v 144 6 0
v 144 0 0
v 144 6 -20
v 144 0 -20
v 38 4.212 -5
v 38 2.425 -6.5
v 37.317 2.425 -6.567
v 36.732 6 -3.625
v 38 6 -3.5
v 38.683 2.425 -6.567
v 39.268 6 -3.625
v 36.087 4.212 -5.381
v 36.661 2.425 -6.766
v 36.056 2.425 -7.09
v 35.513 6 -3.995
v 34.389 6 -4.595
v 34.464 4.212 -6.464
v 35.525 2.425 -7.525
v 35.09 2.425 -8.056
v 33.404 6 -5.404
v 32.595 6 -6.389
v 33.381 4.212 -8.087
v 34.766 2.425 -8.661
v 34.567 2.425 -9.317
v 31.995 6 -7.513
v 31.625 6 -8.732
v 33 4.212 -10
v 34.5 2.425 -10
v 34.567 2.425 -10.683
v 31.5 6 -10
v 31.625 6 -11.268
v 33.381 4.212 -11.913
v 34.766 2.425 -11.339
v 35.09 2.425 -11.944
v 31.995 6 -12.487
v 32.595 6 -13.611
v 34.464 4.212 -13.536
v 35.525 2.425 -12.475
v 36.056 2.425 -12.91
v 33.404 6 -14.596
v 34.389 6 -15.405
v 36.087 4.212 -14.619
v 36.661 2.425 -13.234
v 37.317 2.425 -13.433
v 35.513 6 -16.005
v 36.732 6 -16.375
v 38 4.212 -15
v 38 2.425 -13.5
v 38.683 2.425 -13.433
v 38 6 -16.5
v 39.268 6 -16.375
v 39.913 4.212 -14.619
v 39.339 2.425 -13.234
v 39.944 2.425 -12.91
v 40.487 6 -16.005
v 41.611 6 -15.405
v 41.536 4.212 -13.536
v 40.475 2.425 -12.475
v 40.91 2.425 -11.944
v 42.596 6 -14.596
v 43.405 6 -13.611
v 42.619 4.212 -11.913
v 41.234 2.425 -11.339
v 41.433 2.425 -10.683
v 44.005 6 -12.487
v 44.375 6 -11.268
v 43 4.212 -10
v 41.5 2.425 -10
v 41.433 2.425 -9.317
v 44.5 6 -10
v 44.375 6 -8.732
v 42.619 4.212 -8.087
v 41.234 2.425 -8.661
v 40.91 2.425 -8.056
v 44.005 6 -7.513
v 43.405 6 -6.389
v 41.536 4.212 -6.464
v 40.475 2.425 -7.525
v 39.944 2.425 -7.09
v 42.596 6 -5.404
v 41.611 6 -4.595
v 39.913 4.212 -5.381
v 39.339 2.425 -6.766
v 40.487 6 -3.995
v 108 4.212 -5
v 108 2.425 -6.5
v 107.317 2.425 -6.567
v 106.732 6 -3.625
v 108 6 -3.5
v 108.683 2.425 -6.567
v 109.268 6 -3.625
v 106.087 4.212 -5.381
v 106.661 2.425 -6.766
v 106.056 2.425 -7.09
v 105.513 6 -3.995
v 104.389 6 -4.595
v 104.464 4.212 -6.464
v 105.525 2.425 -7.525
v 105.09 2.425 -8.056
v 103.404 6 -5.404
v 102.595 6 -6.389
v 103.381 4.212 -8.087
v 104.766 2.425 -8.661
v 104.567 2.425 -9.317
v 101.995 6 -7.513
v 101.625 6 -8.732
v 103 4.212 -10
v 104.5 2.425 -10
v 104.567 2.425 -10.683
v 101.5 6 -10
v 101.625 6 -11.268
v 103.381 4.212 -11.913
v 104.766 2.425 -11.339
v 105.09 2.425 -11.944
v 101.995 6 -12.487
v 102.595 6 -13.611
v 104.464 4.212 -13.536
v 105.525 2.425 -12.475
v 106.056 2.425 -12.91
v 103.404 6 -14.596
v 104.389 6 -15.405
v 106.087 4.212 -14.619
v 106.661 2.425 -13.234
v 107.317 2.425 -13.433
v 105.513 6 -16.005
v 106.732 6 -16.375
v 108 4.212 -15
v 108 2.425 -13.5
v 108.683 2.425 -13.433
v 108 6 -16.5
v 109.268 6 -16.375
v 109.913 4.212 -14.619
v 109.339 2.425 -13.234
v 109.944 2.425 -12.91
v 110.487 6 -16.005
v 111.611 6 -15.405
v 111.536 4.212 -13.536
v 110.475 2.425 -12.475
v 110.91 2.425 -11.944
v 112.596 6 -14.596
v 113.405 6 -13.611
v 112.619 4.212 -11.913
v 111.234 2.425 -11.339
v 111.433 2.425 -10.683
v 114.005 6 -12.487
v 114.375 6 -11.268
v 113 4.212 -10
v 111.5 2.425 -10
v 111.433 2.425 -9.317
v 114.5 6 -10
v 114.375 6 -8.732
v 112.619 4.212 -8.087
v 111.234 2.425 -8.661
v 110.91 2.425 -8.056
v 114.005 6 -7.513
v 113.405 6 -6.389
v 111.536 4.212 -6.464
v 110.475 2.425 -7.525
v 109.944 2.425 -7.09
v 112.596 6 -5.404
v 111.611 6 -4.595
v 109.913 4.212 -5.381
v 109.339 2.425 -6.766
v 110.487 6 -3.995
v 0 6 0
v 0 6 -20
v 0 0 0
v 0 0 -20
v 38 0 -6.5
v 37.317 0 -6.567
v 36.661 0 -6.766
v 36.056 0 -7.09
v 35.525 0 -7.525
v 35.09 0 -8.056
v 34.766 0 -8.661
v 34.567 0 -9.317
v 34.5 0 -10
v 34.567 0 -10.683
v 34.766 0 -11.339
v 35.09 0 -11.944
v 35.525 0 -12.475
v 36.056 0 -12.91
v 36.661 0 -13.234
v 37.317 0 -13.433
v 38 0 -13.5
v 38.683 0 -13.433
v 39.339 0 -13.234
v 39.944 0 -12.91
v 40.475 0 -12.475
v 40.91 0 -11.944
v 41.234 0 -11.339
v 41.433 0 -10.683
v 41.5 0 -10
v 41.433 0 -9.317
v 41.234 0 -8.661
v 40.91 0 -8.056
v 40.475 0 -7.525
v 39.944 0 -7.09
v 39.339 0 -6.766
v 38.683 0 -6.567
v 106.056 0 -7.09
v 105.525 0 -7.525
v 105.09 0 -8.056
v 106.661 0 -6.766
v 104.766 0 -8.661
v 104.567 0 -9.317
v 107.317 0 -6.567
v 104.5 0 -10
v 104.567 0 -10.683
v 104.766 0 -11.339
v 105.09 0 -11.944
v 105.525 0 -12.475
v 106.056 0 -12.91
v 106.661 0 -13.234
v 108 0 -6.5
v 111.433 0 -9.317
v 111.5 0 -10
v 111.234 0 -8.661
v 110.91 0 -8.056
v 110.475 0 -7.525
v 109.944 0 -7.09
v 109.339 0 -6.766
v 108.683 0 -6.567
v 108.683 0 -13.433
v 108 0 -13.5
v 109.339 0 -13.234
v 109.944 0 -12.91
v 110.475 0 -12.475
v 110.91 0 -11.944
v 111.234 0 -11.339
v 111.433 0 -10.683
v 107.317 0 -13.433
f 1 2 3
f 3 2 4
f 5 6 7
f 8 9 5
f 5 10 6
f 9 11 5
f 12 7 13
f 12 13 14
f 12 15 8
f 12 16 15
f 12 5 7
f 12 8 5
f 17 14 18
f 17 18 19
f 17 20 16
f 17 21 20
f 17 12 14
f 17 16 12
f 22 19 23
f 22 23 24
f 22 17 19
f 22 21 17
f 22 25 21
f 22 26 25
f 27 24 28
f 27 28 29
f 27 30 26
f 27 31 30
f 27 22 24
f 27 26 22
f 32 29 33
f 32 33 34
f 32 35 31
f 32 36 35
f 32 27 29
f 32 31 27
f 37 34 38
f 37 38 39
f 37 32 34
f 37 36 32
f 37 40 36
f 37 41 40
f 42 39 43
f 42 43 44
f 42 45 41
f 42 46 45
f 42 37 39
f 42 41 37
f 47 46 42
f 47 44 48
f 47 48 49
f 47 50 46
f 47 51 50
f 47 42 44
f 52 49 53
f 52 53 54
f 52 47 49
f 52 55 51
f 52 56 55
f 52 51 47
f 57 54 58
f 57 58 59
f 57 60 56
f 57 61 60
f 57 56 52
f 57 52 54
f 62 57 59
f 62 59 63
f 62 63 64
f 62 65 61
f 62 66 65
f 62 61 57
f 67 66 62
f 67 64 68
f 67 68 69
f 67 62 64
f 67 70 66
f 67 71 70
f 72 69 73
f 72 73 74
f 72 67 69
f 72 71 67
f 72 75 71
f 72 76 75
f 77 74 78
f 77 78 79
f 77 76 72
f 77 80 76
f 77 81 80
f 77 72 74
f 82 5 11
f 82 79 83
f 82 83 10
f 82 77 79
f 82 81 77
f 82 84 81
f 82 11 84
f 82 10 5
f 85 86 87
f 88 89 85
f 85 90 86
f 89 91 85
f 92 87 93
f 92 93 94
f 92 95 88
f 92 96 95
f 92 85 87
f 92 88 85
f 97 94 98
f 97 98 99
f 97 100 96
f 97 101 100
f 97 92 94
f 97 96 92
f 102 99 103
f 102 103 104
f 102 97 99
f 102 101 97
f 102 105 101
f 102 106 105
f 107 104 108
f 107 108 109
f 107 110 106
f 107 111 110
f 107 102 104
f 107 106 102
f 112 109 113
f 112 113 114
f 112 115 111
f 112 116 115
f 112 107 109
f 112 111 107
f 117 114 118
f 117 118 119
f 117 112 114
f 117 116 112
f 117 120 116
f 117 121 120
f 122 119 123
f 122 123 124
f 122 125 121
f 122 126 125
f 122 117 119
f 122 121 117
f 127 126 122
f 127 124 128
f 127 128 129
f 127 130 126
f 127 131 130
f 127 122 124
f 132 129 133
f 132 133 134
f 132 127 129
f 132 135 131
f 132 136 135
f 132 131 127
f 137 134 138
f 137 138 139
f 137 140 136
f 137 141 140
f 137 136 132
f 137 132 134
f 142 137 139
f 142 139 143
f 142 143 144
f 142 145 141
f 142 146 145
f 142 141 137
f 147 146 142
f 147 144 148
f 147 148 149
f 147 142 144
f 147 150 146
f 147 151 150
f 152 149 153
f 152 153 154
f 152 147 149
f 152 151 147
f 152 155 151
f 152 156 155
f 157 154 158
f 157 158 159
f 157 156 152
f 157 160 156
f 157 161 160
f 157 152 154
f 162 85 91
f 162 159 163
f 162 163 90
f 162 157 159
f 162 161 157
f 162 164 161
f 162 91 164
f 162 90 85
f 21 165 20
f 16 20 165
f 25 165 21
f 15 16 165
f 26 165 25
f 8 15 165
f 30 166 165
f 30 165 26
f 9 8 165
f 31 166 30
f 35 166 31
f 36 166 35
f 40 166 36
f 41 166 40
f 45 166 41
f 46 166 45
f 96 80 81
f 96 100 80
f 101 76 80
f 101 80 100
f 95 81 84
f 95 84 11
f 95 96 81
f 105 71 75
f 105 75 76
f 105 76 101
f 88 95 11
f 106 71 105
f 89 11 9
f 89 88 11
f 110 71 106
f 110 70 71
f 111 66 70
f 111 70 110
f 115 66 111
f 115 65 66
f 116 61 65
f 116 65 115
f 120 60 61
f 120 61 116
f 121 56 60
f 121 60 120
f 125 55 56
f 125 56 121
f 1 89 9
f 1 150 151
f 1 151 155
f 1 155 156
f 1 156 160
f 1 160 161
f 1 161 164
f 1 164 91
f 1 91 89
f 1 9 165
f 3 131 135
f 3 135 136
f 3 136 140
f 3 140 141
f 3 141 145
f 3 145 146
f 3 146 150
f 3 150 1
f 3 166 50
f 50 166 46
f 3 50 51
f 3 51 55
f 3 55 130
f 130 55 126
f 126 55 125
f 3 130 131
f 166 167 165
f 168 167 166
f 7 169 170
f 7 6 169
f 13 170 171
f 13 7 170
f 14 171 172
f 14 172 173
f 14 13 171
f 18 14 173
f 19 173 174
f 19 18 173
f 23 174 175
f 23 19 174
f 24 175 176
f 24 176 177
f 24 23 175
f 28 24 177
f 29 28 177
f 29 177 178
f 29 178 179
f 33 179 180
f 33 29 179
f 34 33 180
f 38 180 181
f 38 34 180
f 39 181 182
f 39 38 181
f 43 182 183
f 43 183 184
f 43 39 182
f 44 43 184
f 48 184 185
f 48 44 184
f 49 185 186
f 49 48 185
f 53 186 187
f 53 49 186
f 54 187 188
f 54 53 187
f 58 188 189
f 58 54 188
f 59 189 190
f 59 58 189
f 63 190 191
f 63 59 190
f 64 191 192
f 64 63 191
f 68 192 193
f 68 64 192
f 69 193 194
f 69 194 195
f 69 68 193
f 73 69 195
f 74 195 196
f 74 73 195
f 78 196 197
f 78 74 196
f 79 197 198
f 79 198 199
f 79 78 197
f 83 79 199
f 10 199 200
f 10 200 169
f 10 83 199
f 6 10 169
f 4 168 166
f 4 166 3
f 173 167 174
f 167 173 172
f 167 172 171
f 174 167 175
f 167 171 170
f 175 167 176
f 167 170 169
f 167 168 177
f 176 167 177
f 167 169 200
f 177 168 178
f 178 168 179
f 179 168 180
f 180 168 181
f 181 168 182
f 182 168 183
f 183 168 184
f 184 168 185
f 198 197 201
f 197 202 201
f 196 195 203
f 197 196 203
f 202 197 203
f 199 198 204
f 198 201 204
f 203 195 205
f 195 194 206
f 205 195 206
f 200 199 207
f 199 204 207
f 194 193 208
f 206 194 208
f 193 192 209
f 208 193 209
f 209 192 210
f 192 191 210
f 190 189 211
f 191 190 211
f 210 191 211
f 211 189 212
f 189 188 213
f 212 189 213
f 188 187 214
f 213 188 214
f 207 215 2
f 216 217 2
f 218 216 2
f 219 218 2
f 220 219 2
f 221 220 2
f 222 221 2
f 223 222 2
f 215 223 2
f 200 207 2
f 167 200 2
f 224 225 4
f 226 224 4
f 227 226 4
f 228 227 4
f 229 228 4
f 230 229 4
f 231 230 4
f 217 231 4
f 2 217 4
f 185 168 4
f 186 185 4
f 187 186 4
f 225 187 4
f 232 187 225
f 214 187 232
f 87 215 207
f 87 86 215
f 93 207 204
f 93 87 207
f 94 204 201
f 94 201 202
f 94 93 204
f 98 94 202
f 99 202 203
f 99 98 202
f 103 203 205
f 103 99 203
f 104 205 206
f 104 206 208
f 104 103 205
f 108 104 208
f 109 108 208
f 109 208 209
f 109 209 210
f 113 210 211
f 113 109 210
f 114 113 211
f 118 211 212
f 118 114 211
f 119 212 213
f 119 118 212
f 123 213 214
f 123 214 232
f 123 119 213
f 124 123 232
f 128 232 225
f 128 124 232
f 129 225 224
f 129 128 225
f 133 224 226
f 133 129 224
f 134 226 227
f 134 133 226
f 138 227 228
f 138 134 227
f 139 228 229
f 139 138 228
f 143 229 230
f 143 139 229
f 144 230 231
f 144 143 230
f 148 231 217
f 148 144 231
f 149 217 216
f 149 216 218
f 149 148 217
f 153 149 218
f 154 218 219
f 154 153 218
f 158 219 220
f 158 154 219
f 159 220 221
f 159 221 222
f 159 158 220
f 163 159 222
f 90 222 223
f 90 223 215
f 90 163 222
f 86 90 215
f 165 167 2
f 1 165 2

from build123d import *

# Parameters (mm, degrees)
SKETCH1_W                                      = 144
SKETCH1_H                                      = 20
BOSS_EXTRUDE1_DEPTH                            = 6
CSK_FOR_M5_FLAT_HEAD_MACHINE_SCREW1_AT_2_COUNT = 2
CSK_FOR_M5_FLAT_HEAD_MACHINE_SCREW1_AT_2_PITCH = 70


with BuildPart() as part:
    # Sketch1 → Boss-Extrude1 (new body)
    with BuildSketch(Plane(origin=(0, 0, 0), x_dir=(1, 0, 0), z_dir=(0, 1, 0))):
        with Locations((72, 10)):
            Rectangle(SKETCH1_W, SKETCH1_H)
    extrude(amount=BOSS_EXTRUDE1_DEPTH)

    # Sketch2 → CSK for M5 Flat Head Machine Screw1 (revolve, cut)
    with BuildSketch(Plane(origin=(38, 6, -10), x_dir=(0, 0, 1), z_dir=(1, 0, 0))):
        Polygon((0, 0), (0, 6), (3.5, 6), (3.5, 3.575260778), (6.5, 0), align=None)
    csk_for_m5_flat_head_machine_screw1 = revolve(axis=Axis((38, 12.35, -10), (0, -1, 0)), mode=Mode.SUBTRACT)

    # CSK for M5 Flat Head Machine Screw1 at 2: CSK for M5 Flat Head Machine Screw1 ×2
    with Locations(*[(i * CSK_FOR_M5_FLAT_HEAD_MACHINE_SCREW1_AT_2_PITCH, 0, 0) for i in range(1, CSK_FOR_M5_FLAT_HEAD_MACHINE_SCREW1_AT_2_COUNT)]):
        add(csk_for_m5_flat_head_machine_screw1, mode=Mode.SUBTRACT)


solid = part.part
